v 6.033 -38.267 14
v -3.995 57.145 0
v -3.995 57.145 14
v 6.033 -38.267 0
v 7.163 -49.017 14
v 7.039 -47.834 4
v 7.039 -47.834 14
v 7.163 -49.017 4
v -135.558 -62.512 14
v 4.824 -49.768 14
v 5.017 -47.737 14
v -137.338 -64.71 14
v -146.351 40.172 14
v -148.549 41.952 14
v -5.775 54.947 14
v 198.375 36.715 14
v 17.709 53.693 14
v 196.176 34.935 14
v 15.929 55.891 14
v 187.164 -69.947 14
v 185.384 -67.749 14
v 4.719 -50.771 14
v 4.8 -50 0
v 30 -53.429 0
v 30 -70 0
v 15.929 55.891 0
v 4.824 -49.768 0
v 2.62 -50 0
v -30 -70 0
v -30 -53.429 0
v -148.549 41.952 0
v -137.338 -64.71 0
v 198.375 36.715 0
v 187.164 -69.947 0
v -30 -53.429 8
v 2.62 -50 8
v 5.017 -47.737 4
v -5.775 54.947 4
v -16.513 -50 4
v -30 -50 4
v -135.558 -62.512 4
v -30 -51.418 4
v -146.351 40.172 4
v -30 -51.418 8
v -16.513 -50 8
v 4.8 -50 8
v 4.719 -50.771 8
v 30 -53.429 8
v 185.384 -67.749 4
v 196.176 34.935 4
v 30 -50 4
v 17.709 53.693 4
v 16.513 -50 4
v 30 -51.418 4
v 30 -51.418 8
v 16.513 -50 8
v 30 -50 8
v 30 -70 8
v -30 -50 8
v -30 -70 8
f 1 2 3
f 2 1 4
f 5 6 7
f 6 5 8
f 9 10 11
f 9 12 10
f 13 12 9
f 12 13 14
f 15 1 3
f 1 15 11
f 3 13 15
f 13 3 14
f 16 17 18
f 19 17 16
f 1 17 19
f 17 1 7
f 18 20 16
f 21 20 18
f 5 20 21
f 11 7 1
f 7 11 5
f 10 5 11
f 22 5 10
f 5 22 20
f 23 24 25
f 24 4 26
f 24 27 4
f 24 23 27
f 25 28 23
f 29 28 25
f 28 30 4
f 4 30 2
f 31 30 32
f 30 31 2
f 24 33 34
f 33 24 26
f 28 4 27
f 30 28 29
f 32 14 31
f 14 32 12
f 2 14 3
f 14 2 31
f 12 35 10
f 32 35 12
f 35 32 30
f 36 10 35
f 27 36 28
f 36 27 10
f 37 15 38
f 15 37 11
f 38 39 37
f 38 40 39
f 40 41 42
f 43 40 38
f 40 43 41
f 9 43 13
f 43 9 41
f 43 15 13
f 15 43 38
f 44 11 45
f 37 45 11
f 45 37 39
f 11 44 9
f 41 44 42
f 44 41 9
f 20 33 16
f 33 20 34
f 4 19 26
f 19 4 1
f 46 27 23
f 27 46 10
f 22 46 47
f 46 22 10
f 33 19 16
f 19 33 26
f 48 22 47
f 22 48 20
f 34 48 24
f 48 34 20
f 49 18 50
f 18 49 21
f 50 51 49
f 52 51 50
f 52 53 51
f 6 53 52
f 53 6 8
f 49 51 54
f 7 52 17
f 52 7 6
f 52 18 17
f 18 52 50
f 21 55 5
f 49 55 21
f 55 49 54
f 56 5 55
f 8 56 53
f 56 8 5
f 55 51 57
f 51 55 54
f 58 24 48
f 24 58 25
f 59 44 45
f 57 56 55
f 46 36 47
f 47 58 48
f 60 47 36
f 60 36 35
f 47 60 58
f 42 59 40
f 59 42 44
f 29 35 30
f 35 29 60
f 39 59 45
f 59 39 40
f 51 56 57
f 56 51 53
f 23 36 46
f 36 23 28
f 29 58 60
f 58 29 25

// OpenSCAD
/*
 * Interlock Ergo Lap & Desk Docking Tray
 * Holds Left and Right halves at a fixed ergonomic 12° angle (Alice-style)
 * with integrated 5° tenting for lap or mobile use.
 */

$fn = 40;

u = 19.05;
wall = 4.0;
dock_angle = 12.0; // 12-degree ergonomic split angle

module dock_cradle_half(cols) {
    w = cols * u + 8;
    h = 5 * u + 8;
    difference() {
        cube([w + 4, h + 4, 14]);
        translate([2, 2, 4])
            cube([w, h, 12]);
    }
}

module interlock_dock() {
    // Left angled cradle
    rotate([0, 0, dock_angle * 0.5])
        translate([-(7 * u + 10), -50, 0])
            dock_cradle_half(7);

    // Right angled cradle
    rotate([0, 0, -dock_angle * 0.5])
        translate([10, -50, 0])
            dock_cradle_half(9);

    // Center bridge with wrist rest extension
    translate([-30, -70, 0])
        cube([60, 20, 8]);
}

interlock_dock();
